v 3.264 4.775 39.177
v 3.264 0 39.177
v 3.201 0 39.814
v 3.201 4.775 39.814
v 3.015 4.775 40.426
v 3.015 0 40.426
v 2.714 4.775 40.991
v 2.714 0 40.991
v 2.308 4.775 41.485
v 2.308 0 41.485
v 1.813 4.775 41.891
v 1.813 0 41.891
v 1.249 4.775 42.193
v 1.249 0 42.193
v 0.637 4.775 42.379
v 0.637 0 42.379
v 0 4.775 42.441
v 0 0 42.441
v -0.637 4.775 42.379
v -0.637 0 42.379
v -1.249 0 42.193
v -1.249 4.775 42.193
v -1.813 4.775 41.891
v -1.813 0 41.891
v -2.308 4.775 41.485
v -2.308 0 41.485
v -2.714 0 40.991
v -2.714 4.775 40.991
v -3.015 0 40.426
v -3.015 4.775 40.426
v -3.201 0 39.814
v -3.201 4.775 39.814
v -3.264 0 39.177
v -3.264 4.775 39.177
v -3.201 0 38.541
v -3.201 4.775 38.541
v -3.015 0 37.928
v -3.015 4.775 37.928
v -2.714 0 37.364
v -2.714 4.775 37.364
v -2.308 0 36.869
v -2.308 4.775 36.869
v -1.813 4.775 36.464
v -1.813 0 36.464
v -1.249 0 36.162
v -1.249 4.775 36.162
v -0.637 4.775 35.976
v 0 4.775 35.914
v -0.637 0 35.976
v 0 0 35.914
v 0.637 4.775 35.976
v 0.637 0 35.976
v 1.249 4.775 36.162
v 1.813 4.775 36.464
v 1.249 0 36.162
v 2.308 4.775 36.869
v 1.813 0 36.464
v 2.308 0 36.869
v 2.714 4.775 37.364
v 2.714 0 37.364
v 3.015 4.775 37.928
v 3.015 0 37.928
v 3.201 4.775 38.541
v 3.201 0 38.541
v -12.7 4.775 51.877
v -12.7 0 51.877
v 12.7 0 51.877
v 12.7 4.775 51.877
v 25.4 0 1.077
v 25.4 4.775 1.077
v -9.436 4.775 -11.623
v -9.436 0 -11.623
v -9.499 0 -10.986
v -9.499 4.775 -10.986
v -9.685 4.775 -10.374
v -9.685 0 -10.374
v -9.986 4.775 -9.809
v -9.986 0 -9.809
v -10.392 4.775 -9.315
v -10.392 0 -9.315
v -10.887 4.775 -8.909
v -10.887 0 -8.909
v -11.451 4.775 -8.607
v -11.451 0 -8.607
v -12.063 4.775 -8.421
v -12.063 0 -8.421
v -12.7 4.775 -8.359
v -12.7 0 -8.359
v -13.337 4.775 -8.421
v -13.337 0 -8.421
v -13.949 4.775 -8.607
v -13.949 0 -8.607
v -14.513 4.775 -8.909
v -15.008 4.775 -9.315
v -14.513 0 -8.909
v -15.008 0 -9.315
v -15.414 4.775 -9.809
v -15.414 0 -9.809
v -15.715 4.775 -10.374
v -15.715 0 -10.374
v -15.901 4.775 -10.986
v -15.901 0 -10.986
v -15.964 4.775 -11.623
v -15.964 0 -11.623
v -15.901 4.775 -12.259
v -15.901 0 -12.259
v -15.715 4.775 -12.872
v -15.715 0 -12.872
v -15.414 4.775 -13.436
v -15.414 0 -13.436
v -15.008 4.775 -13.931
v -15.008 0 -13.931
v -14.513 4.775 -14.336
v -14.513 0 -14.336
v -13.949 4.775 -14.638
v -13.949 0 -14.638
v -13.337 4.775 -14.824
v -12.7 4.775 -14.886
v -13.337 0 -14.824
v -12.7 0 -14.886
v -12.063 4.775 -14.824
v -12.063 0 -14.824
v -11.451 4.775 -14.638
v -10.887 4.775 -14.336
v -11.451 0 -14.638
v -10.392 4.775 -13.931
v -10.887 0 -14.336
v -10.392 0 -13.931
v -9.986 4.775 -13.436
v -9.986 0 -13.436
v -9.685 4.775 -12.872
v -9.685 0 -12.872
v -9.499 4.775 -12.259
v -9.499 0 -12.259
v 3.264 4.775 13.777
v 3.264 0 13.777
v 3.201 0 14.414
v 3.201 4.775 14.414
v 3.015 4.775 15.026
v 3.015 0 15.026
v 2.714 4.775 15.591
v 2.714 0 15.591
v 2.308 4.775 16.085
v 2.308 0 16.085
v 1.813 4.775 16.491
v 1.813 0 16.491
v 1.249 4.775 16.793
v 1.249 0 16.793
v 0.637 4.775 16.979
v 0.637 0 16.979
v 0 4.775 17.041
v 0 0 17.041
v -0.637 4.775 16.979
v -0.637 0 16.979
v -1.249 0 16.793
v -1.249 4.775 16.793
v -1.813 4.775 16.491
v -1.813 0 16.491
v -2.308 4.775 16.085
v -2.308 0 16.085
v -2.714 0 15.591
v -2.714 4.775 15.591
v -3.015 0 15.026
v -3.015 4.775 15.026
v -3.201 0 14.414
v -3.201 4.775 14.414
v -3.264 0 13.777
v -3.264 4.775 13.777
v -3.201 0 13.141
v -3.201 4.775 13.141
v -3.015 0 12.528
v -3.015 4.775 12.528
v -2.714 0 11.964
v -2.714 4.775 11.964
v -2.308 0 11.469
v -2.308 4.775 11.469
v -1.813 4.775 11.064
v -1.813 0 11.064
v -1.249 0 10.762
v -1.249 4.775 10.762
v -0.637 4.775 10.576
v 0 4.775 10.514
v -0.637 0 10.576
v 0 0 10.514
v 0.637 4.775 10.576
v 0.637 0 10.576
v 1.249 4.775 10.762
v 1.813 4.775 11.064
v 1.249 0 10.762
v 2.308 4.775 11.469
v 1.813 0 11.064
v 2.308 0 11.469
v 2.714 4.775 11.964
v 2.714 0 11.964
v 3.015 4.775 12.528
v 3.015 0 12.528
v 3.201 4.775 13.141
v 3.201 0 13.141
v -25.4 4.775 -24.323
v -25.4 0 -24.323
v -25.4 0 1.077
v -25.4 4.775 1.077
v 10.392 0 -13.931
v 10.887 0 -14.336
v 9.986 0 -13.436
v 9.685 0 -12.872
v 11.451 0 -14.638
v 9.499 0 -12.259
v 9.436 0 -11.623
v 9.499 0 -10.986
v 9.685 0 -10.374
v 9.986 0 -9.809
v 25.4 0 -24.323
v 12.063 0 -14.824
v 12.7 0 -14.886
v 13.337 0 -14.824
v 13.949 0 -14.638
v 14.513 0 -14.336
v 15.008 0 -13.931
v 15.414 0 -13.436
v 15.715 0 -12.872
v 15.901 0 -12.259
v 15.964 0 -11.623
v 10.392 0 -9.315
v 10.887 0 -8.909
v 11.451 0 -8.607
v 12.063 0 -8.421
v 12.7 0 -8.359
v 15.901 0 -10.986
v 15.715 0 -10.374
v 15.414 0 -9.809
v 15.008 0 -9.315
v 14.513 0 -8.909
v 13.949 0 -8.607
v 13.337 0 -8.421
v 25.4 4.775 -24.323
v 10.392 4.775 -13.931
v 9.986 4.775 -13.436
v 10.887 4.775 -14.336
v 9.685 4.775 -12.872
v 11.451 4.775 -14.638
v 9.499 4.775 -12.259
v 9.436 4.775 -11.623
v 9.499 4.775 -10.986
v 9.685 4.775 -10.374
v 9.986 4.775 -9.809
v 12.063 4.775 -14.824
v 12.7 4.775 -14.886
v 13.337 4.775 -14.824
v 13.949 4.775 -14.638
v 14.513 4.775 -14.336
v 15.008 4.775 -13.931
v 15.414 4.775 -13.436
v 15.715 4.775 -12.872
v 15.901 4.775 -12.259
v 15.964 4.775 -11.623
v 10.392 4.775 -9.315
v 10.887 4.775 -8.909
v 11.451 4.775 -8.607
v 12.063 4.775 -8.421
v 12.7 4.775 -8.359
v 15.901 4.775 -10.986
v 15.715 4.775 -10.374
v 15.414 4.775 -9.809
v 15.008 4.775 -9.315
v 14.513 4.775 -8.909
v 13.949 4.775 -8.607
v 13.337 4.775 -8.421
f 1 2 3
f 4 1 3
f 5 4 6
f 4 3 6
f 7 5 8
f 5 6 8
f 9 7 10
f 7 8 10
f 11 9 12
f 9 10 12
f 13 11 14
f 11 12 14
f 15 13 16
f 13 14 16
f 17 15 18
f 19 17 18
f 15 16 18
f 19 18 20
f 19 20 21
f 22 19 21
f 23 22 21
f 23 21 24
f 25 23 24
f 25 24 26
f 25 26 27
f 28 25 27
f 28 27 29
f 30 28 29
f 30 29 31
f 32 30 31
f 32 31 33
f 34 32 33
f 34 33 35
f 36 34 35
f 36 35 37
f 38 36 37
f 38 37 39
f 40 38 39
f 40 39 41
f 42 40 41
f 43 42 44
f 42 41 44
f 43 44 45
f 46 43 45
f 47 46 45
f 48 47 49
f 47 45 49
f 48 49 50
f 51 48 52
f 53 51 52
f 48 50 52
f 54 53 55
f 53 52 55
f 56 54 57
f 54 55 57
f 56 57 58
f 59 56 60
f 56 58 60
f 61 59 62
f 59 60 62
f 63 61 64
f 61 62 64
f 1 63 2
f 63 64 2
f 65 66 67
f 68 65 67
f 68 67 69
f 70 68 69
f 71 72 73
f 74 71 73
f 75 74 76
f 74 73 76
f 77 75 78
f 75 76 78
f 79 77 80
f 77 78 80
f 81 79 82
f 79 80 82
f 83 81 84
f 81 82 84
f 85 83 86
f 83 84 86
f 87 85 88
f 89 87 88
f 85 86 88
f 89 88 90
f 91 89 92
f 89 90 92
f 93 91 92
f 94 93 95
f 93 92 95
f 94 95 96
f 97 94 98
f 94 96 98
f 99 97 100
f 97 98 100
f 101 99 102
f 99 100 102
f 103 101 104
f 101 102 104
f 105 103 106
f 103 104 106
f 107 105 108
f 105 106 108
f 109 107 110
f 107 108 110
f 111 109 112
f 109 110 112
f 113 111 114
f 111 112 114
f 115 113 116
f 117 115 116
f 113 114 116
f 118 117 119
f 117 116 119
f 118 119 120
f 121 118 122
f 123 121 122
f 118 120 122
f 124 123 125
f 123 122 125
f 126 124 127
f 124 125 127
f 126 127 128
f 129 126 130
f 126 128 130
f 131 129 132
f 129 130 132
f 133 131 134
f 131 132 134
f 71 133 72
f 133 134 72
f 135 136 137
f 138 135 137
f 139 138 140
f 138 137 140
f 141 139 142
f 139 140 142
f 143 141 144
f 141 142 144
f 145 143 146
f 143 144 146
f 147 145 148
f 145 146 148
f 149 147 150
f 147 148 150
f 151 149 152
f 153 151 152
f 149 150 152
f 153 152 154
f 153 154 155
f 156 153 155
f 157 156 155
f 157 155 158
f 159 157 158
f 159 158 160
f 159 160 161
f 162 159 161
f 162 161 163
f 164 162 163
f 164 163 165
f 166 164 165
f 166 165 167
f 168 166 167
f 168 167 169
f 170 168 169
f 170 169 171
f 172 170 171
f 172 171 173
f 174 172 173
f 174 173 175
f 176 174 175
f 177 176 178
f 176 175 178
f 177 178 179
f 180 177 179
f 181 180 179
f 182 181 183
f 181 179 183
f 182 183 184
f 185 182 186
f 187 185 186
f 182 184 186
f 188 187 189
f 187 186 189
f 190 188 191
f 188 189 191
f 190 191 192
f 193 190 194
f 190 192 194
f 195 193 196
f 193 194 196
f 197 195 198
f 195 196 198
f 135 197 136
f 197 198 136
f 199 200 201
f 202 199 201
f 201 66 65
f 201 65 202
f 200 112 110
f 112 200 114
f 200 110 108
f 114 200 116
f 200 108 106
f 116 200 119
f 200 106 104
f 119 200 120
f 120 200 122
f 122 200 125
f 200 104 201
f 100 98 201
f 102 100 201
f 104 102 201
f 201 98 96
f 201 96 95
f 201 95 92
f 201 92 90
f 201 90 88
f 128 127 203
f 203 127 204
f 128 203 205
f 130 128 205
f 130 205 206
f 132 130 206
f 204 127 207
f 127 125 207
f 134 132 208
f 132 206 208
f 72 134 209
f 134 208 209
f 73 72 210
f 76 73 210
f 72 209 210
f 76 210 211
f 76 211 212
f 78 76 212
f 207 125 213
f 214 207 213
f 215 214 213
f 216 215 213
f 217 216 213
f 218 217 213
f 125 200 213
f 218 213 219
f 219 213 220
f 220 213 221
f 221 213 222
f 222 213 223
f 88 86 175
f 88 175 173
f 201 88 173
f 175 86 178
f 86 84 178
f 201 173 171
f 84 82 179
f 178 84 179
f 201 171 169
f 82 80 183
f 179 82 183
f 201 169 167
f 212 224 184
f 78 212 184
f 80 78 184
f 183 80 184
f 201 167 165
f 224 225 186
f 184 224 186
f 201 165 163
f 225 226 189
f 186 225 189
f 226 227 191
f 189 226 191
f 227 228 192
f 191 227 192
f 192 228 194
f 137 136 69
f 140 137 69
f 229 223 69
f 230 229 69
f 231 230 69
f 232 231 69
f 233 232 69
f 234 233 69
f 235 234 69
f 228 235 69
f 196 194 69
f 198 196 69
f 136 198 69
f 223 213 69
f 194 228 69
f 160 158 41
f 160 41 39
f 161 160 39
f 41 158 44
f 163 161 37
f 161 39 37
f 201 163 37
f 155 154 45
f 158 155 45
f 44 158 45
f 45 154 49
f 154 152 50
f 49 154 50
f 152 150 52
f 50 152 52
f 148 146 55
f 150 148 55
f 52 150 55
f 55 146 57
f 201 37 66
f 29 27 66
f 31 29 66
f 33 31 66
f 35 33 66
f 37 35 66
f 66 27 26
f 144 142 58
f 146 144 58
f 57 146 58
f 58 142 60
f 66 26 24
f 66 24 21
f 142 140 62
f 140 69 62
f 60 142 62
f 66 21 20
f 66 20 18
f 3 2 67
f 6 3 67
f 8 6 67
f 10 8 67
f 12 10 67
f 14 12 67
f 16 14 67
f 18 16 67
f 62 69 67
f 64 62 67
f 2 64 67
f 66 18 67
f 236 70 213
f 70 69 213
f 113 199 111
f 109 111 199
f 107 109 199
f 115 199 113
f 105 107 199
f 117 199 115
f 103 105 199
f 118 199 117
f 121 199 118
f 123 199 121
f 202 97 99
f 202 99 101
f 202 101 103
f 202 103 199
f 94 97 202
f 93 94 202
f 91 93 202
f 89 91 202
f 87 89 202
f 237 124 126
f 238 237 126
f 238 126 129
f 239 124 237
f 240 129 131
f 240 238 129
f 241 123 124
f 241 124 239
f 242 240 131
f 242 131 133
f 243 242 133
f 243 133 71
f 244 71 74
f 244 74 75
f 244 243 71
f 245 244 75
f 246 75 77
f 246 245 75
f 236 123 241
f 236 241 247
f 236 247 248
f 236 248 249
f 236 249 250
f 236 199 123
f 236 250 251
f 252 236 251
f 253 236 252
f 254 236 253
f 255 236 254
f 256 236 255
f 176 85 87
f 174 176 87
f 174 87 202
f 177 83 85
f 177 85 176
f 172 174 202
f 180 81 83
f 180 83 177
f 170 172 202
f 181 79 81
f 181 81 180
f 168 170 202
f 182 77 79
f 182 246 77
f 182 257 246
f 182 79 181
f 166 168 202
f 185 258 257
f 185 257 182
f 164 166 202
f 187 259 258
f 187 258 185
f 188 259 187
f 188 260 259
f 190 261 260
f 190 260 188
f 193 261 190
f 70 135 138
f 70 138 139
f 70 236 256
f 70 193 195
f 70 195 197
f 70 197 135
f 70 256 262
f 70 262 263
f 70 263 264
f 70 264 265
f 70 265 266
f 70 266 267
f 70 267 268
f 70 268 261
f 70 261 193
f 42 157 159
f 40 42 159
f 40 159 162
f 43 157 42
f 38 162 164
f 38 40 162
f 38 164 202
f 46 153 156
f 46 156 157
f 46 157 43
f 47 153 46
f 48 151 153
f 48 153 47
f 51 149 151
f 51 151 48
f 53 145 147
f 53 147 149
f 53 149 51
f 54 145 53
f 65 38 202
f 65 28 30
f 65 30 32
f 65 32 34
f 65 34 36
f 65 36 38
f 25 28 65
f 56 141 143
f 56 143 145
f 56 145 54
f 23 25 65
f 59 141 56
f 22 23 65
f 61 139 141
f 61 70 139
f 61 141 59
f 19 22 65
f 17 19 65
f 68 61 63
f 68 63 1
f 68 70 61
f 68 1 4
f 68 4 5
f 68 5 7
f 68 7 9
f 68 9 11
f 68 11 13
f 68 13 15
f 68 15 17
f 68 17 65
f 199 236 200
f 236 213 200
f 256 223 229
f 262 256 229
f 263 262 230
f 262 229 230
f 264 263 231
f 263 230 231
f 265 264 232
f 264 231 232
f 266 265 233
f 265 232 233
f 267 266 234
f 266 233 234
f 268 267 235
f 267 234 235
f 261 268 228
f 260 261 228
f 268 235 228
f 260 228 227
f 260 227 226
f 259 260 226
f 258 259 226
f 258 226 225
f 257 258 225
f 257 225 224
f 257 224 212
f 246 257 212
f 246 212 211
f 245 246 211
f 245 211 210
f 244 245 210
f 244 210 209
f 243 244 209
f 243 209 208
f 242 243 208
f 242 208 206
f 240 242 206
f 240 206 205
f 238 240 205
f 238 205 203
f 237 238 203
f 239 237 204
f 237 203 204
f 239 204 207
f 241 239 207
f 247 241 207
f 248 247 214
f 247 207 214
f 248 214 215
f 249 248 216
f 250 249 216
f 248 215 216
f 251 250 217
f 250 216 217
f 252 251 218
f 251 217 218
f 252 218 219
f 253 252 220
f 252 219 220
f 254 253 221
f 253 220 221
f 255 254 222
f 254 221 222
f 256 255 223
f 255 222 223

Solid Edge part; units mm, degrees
sketch "Sketch1" plane through (0, 0, 0) normal (0, -1, 0) x (1, 0, 0)
  line L0 (12.7, 51.8774) -> (25.4, 1.0774)
  line L1 (25.4, 1.0774) -> (25.4, -24.3226)
  line L2 (25.4, -24.3226) -> (-25.4, -24.3226)
  line L3 (-25.4, -24.3226) -> (-25.4, 1.0774)
  line L4 (-12.7, 51.8774) -> (-25.4, 1.0774)
  line L5 (-12.7, 51.8774) -> (12.7, 51.8774)
  circle A0 centre (0, 13.7774) radius 3.2639
  circle A1 centre (0, 39.1774) radius 3.2639
  circle A2 centre (-12.7, -11.6226) radius 3.2639
  circle A3 centre (12.7, -11.6226) radius 3.2639
  dimension "D1" = 76.2
  dimension "D2" = 50.8
  dimension "D3" = 25.4
  dimension "D4" = 25.4
  dimension "D5" = 6.5278
  dimension "D6" = 25.4
  dimension "D7" = 12.7
  dimension "D8" = 12.7
  dimension "D9" = 25.4
  dimension "D10" = 12.7
extrude "Protrusion1" add sketch "Sketch1" against normal blind 4.7752
